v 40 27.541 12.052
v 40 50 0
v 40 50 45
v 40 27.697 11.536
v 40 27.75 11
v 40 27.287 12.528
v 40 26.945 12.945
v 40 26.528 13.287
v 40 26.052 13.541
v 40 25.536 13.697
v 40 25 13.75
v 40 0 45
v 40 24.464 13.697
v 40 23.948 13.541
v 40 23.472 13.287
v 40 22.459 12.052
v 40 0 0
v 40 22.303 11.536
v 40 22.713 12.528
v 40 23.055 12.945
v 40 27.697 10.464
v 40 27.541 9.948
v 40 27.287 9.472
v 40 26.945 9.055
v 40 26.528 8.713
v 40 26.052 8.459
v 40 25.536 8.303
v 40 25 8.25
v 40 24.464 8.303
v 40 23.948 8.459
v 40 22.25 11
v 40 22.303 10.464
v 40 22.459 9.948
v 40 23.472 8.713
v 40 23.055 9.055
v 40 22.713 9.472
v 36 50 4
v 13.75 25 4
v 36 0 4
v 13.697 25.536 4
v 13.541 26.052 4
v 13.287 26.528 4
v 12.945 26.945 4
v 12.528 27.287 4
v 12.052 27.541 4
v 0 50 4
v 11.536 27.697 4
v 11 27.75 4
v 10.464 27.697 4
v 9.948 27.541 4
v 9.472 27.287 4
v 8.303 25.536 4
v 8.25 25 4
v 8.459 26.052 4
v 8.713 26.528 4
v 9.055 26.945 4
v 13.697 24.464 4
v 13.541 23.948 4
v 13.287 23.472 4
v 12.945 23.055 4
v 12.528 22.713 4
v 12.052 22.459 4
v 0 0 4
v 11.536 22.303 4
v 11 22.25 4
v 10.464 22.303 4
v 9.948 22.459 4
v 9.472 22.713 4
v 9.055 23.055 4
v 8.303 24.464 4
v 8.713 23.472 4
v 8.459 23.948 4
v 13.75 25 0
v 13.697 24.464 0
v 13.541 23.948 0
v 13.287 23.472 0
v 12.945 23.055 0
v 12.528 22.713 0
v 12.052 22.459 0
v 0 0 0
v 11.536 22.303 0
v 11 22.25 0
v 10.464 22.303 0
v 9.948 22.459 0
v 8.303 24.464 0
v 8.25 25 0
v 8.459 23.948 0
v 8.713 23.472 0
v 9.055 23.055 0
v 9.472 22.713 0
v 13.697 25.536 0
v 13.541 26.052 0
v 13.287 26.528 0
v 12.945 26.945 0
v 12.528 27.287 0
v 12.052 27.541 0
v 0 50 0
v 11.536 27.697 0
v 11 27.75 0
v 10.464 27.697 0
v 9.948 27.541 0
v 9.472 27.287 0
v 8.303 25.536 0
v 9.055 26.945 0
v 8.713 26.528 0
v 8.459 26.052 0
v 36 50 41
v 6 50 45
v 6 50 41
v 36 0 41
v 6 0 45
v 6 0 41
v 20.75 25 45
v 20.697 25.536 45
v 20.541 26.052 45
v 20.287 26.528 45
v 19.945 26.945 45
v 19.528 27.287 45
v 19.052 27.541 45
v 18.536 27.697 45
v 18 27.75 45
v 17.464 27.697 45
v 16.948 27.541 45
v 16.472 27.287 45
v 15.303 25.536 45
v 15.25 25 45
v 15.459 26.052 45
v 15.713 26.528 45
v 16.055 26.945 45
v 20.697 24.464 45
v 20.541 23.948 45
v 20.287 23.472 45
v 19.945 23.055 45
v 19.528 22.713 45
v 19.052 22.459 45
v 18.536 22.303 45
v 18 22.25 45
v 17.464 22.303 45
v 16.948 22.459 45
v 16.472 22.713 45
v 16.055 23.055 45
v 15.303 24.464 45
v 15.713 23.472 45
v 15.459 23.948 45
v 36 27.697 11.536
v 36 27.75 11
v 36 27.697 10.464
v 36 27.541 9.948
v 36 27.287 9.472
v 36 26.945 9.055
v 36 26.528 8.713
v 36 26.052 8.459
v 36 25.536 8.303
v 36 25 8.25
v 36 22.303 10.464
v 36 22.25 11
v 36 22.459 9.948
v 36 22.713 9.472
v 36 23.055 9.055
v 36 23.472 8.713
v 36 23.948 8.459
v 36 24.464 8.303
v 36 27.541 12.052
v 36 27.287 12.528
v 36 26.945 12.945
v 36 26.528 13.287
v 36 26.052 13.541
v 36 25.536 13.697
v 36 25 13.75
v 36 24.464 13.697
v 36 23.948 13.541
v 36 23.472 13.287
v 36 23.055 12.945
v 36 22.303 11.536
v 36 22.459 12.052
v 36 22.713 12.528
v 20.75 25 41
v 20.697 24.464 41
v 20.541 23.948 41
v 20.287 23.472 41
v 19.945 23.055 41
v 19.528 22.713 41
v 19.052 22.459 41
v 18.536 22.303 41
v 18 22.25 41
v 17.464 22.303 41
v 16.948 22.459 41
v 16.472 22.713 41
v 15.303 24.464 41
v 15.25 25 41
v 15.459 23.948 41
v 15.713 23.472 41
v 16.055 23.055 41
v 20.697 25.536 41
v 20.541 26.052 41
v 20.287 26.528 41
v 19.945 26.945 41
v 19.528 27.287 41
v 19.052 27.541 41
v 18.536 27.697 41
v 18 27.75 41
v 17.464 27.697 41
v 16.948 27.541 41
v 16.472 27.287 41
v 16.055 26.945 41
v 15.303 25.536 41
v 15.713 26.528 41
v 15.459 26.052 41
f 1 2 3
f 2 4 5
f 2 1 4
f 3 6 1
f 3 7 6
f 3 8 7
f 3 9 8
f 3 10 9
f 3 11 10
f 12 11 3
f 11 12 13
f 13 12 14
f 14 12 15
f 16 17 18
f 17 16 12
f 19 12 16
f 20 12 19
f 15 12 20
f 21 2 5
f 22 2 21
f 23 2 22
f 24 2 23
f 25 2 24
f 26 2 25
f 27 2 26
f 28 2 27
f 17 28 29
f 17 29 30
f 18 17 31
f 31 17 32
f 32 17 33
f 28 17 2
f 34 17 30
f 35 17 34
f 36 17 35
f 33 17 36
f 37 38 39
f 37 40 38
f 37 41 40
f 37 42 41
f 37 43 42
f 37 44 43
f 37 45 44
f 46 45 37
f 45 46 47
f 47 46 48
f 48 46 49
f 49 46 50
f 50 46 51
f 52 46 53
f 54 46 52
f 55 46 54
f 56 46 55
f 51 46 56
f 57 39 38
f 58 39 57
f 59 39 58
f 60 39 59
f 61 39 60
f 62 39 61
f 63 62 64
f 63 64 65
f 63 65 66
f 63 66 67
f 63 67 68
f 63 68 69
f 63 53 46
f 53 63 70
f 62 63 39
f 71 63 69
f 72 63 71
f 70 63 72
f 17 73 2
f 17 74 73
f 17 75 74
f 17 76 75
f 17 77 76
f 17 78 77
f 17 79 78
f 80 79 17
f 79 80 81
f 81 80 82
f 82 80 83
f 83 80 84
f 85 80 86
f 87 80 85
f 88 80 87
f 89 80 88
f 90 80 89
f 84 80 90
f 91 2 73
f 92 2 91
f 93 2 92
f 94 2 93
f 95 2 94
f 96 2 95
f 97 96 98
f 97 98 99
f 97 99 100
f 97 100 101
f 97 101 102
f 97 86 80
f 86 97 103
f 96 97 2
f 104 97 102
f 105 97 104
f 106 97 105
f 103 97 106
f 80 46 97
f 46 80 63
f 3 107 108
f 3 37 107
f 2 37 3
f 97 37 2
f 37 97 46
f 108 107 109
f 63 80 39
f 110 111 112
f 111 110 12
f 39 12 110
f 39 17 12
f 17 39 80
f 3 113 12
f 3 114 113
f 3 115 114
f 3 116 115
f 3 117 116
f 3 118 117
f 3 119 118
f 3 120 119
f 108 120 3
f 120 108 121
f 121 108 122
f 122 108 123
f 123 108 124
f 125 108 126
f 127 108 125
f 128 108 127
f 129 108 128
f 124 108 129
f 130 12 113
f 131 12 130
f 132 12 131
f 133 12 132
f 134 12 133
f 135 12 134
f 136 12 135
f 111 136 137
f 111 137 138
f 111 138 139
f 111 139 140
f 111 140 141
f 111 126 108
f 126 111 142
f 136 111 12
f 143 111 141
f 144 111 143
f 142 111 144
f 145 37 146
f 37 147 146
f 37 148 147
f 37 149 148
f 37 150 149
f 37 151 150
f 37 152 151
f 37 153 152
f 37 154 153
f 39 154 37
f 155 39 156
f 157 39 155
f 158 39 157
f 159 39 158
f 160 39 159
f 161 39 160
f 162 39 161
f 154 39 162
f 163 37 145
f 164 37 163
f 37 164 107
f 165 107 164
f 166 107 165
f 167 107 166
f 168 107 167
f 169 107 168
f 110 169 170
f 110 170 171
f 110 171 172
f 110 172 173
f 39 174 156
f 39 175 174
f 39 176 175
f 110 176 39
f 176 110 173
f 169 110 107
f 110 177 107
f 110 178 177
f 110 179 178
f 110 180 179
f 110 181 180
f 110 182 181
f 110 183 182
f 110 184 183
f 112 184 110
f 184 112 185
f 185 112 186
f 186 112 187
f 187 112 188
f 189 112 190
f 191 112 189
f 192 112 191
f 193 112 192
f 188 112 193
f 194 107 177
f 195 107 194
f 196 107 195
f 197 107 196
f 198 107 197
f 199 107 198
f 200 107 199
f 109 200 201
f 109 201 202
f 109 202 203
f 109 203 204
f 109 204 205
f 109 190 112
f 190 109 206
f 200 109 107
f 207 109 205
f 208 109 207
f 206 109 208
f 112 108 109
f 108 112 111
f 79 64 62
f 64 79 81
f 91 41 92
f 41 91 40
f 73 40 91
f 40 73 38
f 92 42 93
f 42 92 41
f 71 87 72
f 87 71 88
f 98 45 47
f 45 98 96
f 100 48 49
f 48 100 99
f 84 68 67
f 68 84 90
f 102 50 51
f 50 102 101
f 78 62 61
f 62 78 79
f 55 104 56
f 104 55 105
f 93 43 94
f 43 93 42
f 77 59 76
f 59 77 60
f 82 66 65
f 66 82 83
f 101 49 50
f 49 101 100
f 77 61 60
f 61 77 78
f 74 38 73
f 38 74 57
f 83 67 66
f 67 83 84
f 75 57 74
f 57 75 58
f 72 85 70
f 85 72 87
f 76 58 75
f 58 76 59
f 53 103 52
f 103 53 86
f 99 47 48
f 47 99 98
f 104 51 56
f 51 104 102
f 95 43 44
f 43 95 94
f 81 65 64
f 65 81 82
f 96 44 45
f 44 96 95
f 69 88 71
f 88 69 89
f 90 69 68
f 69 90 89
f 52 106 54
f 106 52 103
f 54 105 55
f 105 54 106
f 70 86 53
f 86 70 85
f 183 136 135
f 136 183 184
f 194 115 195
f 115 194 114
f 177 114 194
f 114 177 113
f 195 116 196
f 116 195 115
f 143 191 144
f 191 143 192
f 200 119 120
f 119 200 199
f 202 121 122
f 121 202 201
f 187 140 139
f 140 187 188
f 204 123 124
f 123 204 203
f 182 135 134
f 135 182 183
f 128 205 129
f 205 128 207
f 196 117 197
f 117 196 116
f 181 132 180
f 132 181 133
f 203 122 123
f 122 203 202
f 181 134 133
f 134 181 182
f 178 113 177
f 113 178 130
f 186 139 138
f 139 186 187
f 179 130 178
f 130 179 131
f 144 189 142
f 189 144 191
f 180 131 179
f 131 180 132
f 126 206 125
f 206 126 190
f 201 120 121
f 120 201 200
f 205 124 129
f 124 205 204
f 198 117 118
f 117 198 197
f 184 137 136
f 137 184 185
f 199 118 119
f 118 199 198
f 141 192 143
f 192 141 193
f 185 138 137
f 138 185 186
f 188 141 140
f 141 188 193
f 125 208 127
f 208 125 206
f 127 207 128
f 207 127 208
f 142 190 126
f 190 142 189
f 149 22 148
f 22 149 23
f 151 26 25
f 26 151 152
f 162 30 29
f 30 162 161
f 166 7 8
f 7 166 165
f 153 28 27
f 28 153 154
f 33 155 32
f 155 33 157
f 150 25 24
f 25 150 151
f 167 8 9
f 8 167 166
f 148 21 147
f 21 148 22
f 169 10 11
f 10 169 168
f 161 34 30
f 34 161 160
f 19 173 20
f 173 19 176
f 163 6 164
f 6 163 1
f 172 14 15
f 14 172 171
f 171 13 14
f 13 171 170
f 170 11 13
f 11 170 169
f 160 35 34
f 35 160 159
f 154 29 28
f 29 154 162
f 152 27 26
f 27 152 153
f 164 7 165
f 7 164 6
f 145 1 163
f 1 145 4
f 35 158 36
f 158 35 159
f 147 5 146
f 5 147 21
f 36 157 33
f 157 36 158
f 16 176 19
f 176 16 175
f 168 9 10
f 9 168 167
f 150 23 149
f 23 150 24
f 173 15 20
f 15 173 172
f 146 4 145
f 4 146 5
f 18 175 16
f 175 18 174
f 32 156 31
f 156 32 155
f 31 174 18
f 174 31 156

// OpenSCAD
$fn = 32;

// ----------------------------------------------------------------------
// Z-bracket: 40 x 50 x 45 mm
// ----------------------------------------------------------------------

// --- parameters (mm) ---
lower_len = 40;           // lower foot length, X
upper_len = 30;           // upper foot length, X
width = 50;               // bracket width, Y
rise = 45;                // overall rise, Z
thick = 4;                // plate thickness
hole_d = 5.5;             // clearance for M5

module hole_z(px, py, z0) {
  translate([px, py, z0 - 0.5]) cylinder(h = thick + 1, d = hole_d);
}
module hole_x(py, pz) {
  translate([-0.5, py, pz]) rotate([0, 90, 0]) cylinder(h = thick + 1, d = hole_d);
}

difference() {
  union() {
    cube([lower_len, width, thick]);
    /* web, overlapping the lower foot */
    translate([lower_len - thick, 0, 0]) cube([thick, width, rise]);
    /* upper foot, sunk into the web */
    translate([lower_len - thick - upper_len, 0, rise - thick]) cube([upper_len + thick, width, thick]);
  }
  hole_z(11, 25, 0);
  translate([lower_len - thick - 18, 0, 0]) hole_z(0, 25, rise - thick);
  translate([lower_len - thick, 0, 0]) hole_x(25, 11);
}
